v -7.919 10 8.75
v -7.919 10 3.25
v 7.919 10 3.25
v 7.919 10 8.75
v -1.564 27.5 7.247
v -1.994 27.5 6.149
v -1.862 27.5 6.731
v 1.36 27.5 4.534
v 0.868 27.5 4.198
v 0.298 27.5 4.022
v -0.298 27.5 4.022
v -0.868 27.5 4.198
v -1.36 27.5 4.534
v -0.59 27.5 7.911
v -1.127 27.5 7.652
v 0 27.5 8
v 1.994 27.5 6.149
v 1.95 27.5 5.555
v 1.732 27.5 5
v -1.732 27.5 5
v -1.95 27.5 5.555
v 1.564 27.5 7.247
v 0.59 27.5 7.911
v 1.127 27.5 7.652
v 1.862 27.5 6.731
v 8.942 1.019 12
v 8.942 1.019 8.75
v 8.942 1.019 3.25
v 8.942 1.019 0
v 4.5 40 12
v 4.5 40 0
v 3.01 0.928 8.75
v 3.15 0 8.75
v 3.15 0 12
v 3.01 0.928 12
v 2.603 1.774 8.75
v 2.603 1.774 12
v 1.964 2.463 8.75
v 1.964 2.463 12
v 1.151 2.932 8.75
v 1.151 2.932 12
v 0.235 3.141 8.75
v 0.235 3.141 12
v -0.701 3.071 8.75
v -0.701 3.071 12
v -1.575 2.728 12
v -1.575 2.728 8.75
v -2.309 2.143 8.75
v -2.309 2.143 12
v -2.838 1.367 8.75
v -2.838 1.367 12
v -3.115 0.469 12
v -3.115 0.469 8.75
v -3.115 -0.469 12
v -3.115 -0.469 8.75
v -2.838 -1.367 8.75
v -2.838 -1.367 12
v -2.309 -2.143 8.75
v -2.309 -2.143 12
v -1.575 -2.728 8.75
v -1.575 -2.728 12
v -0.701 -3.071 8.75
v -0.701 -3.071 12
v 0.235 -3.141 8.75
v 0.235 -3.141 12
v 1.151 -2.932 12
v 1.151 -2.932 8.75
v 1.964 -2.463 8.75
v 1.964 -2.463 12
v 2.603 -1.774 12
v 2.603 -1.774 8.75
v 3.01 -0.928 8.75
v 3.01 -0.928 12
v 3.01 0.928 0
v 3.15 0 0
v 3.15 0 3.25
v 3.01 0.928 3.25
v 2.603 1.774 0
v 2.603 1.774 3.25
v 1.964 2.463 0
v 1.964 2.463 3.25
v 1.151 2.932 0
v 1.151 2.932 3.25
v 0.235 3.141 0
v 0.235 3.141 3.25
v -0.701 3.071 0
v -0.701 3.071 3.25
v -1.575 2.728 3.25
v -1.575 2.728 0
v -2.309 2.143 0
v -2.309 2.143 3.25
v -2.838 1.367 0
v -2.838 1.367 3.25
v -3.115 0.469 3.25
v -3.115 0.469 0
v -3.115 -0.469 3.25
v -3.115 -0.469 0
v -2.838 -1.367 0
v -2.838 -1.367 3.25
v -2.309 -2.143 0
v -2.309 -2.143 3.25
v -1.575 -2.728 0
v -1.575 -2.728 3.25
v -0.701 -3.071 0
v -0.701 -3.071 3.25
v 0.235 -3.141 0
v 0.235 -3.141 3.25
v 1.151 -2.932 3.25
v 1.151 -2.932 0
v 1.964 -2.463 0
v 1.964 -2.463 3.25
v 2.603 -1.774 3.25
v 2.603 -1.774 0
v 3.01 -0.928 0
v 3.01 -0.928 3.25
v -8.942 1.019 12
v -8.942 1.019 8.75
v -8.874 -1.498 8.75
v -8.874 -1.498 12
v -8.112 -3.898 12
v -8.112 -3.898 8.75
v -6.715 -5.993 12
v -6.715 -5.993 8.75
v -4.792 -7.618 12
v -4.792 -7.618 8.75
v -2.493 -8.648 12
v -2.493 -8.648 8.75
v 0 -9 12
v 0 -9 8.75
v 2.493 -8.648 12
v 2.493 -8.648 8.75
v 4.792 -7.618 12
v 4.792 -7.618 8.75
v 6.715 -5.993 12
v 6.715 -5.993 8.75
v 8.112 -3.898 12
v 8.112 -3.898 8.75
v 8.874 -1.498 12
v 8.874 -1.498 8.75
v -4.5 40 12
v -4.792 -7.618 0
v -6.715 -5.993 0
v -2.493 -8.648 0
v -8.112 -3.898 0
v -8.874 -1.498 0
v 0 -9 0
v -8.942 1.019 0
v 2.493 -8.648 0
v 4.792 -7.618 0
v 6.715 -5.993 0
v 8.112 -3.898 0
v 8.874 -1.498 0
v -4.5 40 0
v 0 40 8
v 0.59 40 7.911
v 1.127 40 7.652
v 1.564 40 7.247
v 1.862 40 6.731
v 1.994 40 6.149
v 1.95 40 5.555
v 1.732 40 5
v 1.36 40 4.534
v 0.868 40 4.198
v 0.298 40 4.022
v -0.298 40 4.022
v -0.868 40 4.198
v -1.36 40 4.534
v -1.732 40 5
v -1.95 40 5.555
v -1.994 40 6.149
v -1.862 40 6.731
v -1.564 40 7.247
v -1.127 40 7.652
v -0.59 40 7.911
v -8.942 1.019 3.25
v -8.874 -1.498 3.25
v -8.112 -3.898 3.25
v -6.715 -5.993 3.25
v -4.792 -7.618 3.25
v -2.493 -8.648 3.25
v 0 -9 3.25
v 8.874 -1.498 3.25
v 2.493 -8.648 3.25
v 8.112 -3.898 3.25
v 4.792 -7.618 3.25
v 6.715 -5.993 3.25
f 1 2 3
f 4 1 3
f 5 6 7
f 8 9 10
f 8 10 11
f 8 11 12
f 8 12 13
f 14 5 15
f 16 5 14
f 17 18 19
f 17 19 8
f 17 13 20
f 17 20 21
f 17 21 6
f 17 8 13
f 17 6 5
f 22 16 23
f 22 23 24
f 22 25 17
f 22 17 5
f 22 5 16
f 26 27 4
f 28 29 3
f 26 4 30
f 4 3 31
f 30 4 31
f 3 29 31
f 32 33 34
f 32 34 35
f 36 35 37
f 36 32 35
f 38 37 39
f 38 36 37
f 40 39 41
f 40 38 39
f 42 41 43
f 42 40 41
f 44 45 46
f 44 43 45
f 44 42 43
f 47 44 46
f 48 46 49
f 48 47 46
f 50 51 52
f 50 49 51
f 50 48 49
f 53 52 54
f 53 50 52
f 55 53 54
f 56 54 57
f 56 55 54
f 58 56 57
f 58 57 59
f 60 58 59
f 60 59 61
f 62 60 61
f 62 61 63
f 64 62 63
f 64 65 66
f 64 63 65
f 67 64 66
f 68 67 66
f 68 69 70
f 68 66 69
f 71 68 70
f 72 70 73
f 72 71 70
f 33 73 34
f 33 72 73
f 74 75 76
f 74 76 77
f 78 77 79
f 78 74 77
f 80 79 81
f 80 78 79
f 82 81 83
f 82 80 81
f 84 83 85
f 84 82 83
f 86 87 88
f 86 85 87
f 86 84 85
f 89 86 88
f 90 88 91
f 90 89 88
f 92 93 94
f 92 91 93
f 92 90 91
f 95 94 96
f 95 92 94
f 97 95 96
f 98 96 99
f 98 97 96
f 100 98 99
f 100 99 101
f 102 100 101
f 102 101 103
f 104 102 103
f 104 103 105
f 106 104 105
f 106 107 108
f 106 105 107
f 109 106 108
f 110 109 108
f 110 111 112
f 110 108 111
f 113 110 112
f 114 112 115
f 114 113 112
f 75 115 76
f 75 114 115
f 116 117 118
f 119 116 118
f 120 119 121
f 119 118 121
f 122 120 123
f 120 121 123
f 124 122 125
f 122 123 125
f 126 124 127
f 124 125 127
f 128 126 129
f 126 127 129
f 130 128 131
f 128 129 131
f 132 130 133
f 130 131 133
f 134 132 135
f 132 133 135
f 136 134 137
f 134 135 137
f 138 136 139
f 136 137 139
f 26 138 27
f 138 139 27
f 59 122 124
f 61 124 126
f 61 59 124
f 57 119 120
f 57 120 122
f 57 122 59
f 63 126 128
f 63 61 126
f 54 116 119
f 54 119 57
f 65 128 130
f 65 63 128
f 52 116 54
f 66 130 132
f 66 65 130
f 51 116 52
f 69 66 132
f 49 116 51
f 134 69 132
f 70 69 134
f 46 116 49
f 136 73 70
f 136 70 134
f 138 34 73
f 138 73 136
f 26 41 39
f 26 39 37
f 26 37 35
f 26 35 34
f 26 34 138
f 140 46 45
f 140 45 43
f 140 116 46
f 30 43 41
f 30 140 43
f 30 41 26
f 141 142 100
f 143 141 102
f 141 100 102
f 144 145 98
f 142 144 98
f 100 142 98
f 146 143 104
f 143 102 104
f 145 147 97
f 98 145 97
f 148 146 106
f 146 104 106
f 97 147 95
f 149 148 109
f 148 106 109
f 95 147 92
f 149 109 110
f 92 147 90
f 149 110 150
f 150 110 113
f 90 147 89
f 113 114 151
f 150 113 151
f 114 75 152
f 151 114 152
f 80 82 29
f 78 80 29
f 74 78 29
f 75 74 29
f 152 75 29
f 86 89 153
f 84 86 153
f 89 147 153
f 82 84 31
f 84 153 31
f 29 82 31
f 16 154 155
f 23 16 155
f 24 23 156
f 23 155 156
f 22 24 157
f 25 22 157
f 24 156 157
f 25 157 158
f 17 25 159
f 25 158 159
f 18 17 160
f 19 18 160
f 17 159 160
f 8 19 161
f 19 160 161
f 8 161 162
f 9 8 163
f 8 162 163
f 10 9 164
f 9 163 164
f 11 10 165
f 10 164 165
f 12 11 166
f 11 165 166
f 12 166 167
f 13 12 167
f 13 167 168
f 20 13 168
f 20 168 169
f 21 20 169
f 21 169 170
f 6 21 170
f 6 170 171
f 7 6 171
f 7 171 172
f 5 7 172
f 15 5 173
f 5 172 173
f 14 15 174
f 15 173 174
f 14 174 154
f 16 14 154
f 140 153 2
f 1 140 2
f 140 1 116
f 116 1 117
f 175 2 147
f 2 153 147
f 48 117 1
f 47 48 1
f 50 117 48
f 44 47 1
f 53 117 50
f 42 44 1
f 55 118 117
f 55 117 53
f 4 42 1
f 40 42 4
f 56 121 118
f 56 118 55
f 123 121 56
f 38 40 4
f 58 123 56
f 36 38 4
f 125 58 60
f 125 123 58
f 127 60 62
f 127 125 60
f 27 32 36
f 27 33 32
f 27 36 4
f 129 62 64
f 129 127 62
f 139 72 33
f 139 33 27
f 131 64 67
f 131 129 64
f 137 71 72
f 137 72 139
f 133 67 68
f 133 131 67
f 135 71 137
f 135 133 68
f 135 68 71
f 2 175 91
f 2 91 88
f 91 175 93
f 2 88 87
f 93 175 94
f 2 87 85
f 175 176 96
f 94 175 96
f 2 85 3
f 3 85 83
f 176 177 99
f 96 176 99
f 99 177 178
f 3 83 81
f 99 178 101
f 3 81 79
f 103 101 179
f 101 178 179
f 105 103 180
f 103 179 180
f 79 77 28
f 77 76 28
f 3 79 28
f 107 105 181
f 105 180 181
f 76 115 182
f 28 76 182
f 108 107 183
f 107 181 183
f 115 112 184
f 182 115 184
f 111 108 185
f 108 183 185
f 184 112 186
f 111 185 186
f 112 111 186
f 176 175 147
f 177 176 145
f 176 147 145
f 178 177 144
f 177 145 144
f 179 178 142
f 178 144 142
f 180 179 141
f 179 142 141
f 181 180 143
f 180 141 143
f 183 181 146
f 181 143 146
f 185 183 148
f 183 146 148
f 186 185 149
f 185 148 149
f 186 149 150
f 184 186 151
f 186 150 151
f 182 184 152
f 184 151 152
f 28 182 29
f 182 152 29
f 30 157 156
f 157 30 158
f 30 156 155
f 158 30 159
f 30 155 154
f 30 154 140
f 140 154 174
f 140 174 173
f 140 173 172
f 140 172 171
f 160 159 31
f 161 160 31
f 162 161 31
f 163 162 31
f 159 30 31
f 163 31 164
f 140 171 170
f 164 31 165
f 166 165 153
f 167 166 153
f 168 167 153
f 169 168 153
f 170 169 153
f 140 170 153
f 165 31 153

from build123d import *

# Parameters (mm, degrees)
BOSS_EXTRUDE1_DEPTH     = 12
SKETCH5_R               = 2
CUT_EXTRUDE4_DEPTH      = 12.5
CUT_EXTRUDE6_DEPTH      = 10
CUT_EXTRUDE6_DEPTH_BACK = 16
SKETCH9_W               = 19.938266946
SKETCH9_H               = 5.5
CUT_EXTRUDE8_DEPTH      = 43.720018727
CUT_EXTRUDE8_DEPTH_BACK = 43.720018727
SKETCH7_R               = 3.15


with BuildPart() as part:
    # Sketch1 → Boss-Extrude1 (new body)
    with BuildSketch(Plane.XY):
        with BuildLine():
            Line((4.5, 40), (-4.5, 40))
            Line((-4.5, 40), (-8.942125974, 1.019010828))
            ThreePointArc((-8.942125974, 1.019010828), (0, -9), (8.942125974, 1.019010828))
            Line((8.942125974, 1.019010828), (4.5, 40))
        make_face()
    extrude(amount=BOSS_EXTRUDE1_DEPTH)

    # Sketch5 → Cut-Extrude4 (cut)
    with BuildSketch(Plane(origin=(0, 40, 0), x_dir=(1, 0, 0), z_dir=(0, 1, 0))):
        with Locations(Location((0, -6, 0), (0, 0, 270))):
            Circle(SKETCH5_R)
    extrude(amount=-CUT_EXTRUDE4_DEPTH, mode=Mode.SUBTRACT)

    # Sketch9 → Cut-Extrude6 (cut, two sides: drawn at the far end of the back side and taken through both)
    with BuildSketch(Plane(origin=(0, 0, 0), x_dir=(1, 0, 0), z_dir=(0, 1, 0)).offset(-CUT_EXTRUDE6_DEPTH_BACK)):
        with Locations((0, -6)):
            Rectangle(SKETCH9_W, SKETCH9_H)
    extrude(amount=CUT_EXTRUDE6_DEPTH + CUT_EXTRUDE6_DEPTH_BACK, mode=Mode.SUBTRACT)

    # Sketch7 → Cut-Extrude8 (cut, two sides: drawn at the far end of the back side and taken through both)
    with BuildSketch(Plane.XY.offset(-CUT_EXTRUDE8_DEPTH_BACK)):
        Circle(SKETCH7_R)
    extrude(amount=CUT_EXTRUDE8_DEPTH + CUT_EXTRUDE8_DEPTH_BACK, mode=Mode.SUBTRACT)


solid = part.part
